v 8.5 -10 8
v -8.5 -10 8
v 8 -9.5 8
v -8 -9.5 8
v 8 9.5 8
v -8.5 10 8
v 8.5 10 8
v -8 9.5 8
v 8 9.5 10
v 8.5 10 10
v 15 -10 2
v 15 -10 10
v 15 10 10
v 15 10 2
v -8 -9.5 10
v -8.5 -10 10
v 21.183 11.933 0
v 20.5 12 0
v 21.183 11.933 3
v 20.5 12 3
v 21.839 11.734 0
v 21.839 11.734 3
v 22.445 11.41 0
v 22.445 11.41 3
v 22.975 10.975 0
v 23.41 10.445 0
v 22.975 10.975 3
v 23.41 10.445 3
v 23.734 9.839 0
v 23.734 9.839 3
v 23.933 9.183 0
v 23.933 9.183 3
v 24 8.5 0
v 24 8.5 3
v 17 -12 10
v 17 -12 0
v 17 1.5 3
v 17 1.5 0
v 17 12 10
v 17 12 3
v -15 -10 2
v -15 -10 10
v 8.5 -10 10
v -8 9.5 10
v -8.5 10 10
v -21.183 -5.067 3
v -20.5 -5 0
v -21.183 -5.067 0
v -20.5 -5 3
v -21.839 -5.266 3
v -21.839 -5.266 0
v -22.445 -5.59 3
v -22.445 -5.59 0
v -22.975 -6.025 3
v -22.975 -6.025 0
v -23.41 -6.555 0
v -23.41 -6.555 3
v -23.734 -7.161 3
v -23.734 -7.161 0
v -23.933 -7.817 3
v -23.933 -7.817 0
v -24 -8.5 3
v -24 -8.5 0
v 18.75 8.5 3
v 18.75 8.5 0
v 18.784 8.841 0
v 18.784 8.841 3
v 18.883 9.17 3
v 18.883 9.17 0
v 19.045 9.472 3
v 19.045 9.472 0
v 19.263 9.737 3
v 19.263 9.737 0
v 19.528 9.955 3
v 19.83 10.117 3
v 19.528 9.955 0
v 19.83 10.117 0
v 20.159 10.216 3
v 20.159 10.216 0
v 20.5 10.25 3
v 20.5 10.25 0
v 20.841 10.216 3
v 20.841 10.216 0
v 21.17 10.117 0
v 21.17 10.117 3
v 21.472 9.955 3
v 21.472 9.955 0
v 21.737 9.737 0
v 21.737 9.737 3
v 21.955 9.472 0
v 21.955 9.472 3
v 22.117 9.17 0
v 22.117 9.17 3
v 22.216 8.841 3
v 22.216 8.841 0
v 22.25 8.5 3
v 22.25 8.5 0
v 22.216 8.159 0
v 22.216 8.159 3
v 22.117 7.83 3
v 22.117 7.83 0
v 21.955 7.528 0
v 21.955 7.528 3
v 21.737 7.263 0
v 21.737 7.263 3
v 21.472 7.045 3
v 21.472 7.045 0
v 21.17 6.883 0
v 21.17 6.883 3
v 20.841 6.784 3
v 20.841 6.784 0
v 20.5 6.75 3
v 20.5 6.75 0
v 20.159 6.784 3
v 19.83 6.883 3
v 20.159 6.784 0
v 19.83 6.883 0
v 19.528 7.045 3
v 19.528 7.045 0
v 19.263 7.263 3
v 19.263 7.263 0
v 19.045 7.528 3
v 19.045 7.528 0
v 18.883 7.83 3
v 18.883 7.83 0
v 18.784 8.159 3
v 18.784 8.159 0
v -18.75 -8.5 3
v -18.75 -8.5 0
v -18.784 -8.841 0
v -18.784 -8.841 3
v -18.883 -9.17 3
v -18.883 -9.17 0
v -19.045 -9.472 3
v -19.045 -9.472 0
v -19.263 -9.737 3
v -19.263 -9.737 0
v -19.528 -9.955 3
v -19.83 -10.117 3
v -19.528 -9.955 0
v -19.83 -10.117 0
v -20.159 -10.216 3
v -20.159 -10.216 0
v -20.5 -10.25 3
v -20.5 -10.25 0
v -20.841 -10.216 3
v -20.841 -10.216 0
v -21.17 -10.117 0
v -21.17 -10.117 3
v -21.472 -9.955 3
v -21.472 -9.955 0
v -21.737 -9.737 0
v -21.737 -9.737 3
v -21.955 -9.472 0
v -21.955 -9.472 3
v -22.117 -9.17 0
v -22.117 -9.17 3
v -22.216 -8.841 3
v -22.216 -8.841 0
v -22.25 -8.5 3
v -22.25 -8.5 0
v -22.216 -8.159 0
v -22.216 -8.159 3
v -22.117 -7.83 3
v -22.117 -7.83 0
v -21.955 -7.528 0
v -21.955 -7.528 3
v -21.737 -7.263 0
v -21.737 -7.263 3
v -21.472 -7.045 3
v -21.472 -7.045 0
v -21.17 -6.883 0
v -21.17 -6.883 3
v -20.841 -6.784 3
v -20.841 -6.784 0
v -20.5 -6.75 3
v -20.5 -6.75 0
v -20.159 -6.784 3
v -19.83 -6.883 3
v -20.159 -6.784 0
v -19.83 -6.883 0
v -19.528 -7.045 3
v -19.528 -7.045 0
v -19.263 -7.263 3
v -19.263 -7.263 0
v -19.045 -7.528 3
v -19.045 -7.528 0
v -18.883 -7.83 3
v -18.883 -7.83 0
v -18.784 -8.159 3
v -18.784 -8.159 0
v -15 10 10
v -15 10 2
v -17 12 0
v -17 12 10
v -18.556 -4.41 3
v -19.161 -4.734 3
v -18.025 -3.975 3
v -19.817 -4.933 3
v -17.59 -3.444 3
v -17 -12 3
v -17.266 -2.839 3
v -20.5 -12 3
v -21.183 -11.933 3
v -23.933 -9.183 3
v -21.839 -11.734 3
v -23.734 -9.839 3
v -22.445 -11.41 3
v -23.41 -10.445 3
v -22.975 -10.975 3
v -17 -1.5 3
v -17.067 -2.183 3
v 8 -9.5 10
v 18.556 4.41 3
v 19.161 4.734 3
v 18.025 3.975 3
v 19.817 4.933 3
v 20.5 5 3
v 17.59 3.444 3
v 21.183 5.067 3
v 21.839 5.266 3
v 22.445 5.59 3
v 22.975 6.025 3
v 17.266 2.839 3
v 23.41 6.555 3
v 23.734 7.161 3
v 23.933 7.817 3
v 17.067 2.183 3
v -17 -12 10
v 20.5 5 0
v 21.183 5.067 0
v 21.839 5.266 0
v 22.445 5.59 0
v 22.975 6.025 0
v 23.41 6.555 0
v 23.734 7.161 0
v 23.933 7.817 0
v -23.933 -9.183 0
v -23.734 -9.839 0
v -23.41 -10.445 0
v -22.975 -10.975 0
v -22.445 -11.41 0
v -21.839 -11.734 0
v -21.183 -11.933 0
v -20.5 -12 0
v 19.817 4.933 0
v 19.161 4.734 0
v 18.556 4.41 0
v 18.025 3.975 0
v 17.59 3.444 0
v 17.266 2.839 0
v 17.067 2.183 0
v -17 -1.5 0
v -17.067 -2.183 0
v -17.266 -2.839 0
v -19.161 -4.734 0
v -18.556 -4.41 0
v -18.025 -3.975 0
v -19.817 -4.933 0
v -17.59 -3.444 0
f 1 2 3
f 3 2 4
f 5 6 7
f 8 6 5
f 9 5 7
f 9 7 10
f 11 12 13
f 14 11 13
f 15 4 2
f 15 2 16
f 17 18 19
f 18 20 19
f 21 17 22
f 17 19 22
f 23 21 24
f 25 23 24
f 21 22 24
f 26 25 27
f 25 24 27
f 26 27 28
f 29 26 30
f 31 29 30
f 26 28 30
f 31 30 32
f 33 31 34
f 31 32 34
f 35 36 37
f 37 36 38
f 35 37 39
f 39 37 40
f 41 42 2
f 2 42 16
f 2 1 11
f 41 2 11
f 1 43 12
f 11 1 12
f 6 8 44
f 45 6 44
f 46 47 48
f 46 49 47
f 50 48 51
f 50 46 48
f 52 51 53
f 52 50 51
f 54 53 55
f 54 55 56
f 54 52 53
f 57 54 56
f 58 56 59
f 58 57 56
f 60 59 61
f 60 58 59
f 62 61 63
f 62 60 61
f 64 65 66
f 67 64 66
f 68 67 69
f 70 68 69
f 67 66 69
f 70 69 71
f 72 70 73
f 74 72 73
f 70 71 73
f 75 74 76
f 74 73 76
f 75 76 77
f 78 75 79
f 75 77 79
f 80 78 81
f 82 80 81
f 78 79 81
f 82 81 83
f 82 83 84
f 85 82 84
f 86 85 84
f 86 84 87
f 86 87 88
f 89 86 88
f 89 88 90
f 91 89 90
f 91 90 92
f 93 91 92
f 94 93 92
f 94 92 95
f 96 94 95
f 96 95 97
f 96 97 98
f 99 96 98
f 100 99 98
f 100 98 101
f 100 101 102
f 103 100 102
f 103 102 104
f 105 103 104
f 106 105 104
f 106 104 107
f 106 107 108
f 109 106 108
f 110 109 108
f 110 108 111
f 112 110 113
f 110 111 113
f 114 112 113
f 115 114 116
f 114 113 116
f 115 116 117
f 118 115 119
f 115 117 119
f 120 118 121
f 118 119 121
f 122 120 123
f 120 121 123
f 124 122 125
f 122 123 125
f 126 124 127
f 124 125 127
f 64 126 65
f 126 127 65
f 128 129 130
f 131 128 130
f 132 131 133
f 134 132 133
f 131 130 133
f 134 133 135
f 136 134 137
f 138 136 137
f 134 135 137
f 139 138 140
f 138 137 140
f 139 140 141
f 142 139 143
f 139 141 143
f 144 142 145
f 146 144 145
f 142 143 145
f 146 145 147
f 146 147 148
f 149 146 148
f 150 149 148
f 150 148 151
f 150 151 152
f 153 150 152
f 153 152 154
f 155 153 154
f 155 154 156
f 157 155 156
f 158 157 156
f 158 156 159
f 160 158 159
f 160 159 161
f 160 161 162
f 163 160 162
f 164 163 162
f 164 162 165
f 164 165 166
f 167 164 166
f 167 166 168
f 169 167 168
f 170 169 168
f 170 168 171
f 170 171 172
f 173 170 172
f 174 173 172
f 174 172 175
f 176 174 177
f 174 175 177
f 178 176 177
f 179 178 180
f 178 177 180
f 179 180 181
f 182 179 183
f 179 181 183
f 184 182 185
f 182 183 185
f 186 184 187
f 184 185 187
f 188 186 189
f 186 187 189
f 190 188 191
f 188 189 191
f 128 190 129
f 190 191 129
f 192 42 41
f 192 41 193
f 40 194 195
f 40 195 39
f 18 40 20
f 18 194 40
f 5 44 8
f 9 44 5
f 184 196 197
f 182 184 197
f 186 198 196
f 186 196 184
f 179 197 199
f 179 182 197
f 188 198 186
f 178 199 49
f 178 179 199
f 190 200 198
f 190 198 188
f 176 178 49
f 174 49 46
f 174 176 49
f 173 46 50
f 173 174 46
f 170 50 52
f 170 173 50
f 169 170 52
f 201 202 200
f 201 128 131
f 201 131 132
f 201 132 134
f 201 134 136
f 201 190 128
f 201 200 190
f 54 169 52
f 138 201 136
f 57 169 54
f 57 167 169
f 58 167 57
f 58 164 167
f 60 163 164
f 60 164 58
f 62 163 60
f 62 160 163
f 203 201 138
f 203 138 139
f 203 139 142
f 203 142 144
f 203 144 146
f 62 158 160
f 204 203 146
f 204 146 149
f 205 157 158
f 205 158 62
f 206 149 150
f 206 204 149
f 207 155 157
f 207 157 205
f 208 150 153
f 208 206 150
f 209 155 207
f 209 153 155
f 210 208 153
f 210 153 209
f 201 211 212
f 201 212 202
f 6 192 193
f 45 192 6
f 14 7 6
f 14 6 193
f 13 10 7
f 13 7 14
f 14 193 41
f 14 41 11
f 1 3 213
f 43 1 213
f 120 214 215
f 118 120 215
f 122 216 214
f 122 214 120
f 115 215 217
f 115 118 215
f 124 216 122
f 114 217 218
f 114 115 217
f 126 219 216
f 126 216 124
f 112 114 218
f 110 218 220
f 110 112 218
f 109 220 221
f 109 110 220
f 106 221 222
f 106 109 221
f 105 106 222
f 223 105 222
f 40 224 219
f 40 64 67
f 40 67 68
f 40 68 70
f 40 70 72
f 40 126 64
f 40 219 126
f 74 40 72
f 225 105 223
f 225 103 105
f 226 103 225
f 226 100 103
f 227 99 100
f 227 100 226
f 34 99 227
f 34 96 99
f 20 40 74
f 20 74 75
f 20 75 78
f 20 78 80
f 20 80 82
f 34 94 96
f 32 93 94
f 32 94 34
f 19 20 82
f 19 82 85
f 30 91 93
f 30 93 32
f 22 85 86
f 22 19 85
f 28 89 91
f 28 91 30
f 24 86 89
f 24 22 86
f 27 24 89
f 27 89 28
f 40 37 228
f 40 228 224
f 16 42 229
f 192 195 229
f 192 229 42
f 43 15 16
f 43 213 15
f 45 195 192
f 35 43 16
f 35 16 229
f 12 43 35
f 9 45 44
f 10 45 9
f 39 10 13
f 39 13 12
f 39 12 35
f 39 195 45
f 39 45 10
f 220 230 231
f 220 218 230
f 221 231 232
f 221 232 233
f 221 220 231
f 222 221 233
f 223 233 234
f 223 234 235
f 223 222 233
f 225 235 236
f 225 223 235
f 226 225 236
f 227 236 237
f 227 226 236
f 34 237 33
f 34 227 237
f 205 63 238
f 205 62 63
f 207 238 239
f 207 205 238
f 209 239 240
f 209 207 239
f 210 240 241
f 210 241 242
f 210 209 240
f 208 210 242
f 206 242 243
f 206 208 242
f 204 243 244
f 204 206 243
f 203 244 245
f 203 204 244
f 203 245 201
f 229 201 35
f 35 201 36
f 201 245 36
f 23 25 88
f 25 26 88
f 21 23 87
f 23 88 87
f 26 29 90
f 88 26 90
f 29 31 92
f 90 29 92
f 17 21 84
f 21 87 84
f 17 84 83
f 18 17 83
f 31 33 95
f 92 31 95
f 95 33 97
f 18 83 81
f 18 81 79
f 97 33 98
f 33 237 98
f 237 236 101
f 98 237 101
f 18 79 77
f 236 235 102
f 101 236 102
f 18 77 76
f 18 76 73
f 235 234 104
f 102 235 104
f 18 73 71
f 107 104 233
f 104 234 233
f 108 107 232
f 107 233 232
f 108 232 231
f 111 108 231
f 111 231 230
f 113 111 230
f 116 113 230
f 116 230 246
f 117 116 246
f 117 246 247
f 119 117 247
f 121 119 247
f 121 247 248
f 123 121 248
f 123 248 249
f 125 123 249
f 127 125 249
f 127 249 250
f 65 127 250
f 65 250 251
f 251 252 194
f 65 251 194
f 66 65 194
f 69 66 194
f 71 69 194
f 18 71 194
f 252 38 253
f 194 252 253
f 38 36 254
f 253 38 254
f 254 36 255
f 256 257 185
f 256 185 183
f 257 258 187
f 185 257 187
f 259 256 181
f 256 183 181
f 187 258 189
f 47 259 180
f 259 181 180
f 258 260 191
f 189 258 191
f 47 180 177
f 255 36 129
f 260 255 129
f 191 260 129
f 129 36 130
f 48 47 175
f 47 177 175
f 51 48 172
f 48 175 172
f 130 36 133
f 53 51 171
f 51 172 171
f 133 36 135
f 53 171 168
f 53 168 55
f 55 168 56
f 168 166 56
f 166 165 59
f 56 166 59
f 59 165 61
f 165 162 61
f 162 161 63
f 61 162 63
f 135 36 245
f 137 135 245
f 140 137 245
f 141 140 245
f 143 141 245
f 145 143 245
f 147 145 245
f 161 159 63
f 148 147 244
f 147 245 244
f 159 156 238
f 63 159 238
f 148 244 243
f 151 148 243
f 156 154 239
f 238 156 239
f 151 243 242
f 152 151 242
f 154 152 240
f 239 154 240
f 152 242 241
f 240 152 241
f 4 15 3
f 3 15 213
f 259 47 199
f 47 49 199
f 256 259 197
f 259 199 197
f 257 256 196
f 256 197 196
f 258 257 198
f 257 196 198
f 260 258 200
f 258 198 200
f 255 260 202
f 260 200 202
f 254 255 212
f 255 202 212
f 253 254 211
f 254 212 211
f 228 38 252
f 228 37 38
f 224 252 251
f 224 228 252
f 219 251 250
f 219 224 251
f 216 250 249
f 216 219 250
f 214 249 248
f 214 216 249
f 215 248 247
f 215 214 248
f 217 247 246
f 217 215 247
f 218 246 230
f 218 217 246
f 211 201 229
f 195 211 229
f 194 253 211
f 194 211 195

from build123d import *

# Parameters (mm, degrees)
SKETCH1_W                = 34
SKETCH1_H                = 24
BOSS_EXTRUDE1_DEPTH      = 10
SKETCH2_W                = 30
SKETCH2_H                = 20
CUT_EXTRUDE1_DEPTH       = 8
SKETCH3_W                = 16
SKETCH3_H                = 2
BOSS_EXTRUDE2_DEPTH      = 0.5
CHAMFER1_SIZE            = 0.5
SKETCH4_W                = 7
SKETCH4_H                = 7
BOSS_EXTRUDE3_DEPTH      = 3
FILLET1_R                = 3.5
SKETCH6_R                = 1.75
CUT_EXTRUDE2_DEPTH       = 29.635642127
CIRPATTERN2_COUNT        = 2
FILLET1_OF_CIRPATTERN2_R = 3.5
FILLET2_R                = 3.5


with BuildPart() as part:
    # Sketch1 → Boss-Extrude1 (new body)
    with BuildSketch(Plane.XY):
        Rectangle(SKETCH1_W, SKETCH1_H)
    extrude(amount=BOSS_EXTRUDE1_DEPTH)

    # Sketch2 → Cut-Extrude1 (cut)
    with BuildSketch(Plane.XY.offset(10)):
        Rectangle(SKETCH2_W, SKETCH2_H)
    extrude(amount=-CUT_EXTRUDE1_DEPTH, mode=Mode.SUBTRACT)

    # Sketch3 → Boss-Extrude2 (add)
    with BuildSketch(Plane.XZ.offset(-10)):
        with Locations((0, 9)):
            Rectangle(SKETCH3_W, SKETCH3_H)
    boss_extrude2 = extrude(amount=BOSS_EXTRUDE2_DEPTH)

    # Mirror1: Boss-Extrude2 across plane
    add(boss_extrude2.mirror(Plane.ZX))

    # Chamfer1
    chamfer1_edges = [part.edges().sort_by_distance(p)[0] for p in [
        (8, 10, 9),
        (-8, 10, 9),
        (-8, -10, 9),
        (8, -10, 9),
    ]]
    chamfer(chamfer1_edges, length=CHAMFER1_SIZE - 0.0001)  # a hair under: the kernel refuses the full size

    # Sketch4 → Boss-Extrude3 (add)
    with BuildSketch(Plane.XY):
        with Locations((20.5, 8.5)):
            Rectangle(SKETCH4_W, SKETCH4_H)
    boss_extrude3 = extrude(amount=BOSS_EXTRUDE3_DEPTH)

    # Fillet1
    fillet1_edges = [part.edges().sort_by_distance(p)[0] for p in [
        (24, 12, 1.5),
        (24, 5, 1.5),
    ]]
    fillet(fillet1_edges, radius=FILLET1_R - 0.0001)  # a hair under: the kernel refuses the full size

    # Sketch6 → Cut-Extrude2 (cut, through all)
    with BuildSketch(Plane(origin=(0, 0, 0), x_dir=(-1, 0, 0), z_dir=(0, 0, -1))):
        with Locations((-20.5, 8.5)):
            Circle(SKETCH6_R)
    cut_extrude2 = extrude(amount=-CUT_EXTRUDE2_DEPTH, mode=Mode.SUBTRACT)

    # CirPattern2: Boss-Extrude3, Cut-Extrude2 ×2 about axis
    cirpattern2_axis = Axis((0, 0, 0), (0, 0, 1))
    add([boss_extrude3.rotate(cirpattern2_axis, i * 360 / CIRPATTERN2_COUNT) for i in range(1, CIRPATTERN2_COUNT)])
    add([cut_extrude2.rotate(cirpattern2_axis, i * 360 / CIRPATTERN2_COUNT) for i in range(1, CIRPATTERN2_COUNT)], mode=Mode.SUBTRACT)

    # Fillet1 of CirPattern2
    fillet1_of_cirpattern2_edges = [part.edges().sort_by_distance(p)[0] for p in [
        (-24, -12, 1.5),
        (-24, -5, 1.5),
    ]]
    fillet(fillet1_of_cirpattern2_edges, radius=FILLET1_OF_CIRPATTERN2_R - 0.0001)  # a hair under: the kernel refuses the full size

    # Fillet2
    fillet2_edges = [part.edges().sort_by_distance(p)[0] for p in [
        (-17, -5, 1.5),
        (17, 5, 1.5),
    ]]
    fillet(fillet2_edges, radius=FILLET2_R)


solid = part.part
